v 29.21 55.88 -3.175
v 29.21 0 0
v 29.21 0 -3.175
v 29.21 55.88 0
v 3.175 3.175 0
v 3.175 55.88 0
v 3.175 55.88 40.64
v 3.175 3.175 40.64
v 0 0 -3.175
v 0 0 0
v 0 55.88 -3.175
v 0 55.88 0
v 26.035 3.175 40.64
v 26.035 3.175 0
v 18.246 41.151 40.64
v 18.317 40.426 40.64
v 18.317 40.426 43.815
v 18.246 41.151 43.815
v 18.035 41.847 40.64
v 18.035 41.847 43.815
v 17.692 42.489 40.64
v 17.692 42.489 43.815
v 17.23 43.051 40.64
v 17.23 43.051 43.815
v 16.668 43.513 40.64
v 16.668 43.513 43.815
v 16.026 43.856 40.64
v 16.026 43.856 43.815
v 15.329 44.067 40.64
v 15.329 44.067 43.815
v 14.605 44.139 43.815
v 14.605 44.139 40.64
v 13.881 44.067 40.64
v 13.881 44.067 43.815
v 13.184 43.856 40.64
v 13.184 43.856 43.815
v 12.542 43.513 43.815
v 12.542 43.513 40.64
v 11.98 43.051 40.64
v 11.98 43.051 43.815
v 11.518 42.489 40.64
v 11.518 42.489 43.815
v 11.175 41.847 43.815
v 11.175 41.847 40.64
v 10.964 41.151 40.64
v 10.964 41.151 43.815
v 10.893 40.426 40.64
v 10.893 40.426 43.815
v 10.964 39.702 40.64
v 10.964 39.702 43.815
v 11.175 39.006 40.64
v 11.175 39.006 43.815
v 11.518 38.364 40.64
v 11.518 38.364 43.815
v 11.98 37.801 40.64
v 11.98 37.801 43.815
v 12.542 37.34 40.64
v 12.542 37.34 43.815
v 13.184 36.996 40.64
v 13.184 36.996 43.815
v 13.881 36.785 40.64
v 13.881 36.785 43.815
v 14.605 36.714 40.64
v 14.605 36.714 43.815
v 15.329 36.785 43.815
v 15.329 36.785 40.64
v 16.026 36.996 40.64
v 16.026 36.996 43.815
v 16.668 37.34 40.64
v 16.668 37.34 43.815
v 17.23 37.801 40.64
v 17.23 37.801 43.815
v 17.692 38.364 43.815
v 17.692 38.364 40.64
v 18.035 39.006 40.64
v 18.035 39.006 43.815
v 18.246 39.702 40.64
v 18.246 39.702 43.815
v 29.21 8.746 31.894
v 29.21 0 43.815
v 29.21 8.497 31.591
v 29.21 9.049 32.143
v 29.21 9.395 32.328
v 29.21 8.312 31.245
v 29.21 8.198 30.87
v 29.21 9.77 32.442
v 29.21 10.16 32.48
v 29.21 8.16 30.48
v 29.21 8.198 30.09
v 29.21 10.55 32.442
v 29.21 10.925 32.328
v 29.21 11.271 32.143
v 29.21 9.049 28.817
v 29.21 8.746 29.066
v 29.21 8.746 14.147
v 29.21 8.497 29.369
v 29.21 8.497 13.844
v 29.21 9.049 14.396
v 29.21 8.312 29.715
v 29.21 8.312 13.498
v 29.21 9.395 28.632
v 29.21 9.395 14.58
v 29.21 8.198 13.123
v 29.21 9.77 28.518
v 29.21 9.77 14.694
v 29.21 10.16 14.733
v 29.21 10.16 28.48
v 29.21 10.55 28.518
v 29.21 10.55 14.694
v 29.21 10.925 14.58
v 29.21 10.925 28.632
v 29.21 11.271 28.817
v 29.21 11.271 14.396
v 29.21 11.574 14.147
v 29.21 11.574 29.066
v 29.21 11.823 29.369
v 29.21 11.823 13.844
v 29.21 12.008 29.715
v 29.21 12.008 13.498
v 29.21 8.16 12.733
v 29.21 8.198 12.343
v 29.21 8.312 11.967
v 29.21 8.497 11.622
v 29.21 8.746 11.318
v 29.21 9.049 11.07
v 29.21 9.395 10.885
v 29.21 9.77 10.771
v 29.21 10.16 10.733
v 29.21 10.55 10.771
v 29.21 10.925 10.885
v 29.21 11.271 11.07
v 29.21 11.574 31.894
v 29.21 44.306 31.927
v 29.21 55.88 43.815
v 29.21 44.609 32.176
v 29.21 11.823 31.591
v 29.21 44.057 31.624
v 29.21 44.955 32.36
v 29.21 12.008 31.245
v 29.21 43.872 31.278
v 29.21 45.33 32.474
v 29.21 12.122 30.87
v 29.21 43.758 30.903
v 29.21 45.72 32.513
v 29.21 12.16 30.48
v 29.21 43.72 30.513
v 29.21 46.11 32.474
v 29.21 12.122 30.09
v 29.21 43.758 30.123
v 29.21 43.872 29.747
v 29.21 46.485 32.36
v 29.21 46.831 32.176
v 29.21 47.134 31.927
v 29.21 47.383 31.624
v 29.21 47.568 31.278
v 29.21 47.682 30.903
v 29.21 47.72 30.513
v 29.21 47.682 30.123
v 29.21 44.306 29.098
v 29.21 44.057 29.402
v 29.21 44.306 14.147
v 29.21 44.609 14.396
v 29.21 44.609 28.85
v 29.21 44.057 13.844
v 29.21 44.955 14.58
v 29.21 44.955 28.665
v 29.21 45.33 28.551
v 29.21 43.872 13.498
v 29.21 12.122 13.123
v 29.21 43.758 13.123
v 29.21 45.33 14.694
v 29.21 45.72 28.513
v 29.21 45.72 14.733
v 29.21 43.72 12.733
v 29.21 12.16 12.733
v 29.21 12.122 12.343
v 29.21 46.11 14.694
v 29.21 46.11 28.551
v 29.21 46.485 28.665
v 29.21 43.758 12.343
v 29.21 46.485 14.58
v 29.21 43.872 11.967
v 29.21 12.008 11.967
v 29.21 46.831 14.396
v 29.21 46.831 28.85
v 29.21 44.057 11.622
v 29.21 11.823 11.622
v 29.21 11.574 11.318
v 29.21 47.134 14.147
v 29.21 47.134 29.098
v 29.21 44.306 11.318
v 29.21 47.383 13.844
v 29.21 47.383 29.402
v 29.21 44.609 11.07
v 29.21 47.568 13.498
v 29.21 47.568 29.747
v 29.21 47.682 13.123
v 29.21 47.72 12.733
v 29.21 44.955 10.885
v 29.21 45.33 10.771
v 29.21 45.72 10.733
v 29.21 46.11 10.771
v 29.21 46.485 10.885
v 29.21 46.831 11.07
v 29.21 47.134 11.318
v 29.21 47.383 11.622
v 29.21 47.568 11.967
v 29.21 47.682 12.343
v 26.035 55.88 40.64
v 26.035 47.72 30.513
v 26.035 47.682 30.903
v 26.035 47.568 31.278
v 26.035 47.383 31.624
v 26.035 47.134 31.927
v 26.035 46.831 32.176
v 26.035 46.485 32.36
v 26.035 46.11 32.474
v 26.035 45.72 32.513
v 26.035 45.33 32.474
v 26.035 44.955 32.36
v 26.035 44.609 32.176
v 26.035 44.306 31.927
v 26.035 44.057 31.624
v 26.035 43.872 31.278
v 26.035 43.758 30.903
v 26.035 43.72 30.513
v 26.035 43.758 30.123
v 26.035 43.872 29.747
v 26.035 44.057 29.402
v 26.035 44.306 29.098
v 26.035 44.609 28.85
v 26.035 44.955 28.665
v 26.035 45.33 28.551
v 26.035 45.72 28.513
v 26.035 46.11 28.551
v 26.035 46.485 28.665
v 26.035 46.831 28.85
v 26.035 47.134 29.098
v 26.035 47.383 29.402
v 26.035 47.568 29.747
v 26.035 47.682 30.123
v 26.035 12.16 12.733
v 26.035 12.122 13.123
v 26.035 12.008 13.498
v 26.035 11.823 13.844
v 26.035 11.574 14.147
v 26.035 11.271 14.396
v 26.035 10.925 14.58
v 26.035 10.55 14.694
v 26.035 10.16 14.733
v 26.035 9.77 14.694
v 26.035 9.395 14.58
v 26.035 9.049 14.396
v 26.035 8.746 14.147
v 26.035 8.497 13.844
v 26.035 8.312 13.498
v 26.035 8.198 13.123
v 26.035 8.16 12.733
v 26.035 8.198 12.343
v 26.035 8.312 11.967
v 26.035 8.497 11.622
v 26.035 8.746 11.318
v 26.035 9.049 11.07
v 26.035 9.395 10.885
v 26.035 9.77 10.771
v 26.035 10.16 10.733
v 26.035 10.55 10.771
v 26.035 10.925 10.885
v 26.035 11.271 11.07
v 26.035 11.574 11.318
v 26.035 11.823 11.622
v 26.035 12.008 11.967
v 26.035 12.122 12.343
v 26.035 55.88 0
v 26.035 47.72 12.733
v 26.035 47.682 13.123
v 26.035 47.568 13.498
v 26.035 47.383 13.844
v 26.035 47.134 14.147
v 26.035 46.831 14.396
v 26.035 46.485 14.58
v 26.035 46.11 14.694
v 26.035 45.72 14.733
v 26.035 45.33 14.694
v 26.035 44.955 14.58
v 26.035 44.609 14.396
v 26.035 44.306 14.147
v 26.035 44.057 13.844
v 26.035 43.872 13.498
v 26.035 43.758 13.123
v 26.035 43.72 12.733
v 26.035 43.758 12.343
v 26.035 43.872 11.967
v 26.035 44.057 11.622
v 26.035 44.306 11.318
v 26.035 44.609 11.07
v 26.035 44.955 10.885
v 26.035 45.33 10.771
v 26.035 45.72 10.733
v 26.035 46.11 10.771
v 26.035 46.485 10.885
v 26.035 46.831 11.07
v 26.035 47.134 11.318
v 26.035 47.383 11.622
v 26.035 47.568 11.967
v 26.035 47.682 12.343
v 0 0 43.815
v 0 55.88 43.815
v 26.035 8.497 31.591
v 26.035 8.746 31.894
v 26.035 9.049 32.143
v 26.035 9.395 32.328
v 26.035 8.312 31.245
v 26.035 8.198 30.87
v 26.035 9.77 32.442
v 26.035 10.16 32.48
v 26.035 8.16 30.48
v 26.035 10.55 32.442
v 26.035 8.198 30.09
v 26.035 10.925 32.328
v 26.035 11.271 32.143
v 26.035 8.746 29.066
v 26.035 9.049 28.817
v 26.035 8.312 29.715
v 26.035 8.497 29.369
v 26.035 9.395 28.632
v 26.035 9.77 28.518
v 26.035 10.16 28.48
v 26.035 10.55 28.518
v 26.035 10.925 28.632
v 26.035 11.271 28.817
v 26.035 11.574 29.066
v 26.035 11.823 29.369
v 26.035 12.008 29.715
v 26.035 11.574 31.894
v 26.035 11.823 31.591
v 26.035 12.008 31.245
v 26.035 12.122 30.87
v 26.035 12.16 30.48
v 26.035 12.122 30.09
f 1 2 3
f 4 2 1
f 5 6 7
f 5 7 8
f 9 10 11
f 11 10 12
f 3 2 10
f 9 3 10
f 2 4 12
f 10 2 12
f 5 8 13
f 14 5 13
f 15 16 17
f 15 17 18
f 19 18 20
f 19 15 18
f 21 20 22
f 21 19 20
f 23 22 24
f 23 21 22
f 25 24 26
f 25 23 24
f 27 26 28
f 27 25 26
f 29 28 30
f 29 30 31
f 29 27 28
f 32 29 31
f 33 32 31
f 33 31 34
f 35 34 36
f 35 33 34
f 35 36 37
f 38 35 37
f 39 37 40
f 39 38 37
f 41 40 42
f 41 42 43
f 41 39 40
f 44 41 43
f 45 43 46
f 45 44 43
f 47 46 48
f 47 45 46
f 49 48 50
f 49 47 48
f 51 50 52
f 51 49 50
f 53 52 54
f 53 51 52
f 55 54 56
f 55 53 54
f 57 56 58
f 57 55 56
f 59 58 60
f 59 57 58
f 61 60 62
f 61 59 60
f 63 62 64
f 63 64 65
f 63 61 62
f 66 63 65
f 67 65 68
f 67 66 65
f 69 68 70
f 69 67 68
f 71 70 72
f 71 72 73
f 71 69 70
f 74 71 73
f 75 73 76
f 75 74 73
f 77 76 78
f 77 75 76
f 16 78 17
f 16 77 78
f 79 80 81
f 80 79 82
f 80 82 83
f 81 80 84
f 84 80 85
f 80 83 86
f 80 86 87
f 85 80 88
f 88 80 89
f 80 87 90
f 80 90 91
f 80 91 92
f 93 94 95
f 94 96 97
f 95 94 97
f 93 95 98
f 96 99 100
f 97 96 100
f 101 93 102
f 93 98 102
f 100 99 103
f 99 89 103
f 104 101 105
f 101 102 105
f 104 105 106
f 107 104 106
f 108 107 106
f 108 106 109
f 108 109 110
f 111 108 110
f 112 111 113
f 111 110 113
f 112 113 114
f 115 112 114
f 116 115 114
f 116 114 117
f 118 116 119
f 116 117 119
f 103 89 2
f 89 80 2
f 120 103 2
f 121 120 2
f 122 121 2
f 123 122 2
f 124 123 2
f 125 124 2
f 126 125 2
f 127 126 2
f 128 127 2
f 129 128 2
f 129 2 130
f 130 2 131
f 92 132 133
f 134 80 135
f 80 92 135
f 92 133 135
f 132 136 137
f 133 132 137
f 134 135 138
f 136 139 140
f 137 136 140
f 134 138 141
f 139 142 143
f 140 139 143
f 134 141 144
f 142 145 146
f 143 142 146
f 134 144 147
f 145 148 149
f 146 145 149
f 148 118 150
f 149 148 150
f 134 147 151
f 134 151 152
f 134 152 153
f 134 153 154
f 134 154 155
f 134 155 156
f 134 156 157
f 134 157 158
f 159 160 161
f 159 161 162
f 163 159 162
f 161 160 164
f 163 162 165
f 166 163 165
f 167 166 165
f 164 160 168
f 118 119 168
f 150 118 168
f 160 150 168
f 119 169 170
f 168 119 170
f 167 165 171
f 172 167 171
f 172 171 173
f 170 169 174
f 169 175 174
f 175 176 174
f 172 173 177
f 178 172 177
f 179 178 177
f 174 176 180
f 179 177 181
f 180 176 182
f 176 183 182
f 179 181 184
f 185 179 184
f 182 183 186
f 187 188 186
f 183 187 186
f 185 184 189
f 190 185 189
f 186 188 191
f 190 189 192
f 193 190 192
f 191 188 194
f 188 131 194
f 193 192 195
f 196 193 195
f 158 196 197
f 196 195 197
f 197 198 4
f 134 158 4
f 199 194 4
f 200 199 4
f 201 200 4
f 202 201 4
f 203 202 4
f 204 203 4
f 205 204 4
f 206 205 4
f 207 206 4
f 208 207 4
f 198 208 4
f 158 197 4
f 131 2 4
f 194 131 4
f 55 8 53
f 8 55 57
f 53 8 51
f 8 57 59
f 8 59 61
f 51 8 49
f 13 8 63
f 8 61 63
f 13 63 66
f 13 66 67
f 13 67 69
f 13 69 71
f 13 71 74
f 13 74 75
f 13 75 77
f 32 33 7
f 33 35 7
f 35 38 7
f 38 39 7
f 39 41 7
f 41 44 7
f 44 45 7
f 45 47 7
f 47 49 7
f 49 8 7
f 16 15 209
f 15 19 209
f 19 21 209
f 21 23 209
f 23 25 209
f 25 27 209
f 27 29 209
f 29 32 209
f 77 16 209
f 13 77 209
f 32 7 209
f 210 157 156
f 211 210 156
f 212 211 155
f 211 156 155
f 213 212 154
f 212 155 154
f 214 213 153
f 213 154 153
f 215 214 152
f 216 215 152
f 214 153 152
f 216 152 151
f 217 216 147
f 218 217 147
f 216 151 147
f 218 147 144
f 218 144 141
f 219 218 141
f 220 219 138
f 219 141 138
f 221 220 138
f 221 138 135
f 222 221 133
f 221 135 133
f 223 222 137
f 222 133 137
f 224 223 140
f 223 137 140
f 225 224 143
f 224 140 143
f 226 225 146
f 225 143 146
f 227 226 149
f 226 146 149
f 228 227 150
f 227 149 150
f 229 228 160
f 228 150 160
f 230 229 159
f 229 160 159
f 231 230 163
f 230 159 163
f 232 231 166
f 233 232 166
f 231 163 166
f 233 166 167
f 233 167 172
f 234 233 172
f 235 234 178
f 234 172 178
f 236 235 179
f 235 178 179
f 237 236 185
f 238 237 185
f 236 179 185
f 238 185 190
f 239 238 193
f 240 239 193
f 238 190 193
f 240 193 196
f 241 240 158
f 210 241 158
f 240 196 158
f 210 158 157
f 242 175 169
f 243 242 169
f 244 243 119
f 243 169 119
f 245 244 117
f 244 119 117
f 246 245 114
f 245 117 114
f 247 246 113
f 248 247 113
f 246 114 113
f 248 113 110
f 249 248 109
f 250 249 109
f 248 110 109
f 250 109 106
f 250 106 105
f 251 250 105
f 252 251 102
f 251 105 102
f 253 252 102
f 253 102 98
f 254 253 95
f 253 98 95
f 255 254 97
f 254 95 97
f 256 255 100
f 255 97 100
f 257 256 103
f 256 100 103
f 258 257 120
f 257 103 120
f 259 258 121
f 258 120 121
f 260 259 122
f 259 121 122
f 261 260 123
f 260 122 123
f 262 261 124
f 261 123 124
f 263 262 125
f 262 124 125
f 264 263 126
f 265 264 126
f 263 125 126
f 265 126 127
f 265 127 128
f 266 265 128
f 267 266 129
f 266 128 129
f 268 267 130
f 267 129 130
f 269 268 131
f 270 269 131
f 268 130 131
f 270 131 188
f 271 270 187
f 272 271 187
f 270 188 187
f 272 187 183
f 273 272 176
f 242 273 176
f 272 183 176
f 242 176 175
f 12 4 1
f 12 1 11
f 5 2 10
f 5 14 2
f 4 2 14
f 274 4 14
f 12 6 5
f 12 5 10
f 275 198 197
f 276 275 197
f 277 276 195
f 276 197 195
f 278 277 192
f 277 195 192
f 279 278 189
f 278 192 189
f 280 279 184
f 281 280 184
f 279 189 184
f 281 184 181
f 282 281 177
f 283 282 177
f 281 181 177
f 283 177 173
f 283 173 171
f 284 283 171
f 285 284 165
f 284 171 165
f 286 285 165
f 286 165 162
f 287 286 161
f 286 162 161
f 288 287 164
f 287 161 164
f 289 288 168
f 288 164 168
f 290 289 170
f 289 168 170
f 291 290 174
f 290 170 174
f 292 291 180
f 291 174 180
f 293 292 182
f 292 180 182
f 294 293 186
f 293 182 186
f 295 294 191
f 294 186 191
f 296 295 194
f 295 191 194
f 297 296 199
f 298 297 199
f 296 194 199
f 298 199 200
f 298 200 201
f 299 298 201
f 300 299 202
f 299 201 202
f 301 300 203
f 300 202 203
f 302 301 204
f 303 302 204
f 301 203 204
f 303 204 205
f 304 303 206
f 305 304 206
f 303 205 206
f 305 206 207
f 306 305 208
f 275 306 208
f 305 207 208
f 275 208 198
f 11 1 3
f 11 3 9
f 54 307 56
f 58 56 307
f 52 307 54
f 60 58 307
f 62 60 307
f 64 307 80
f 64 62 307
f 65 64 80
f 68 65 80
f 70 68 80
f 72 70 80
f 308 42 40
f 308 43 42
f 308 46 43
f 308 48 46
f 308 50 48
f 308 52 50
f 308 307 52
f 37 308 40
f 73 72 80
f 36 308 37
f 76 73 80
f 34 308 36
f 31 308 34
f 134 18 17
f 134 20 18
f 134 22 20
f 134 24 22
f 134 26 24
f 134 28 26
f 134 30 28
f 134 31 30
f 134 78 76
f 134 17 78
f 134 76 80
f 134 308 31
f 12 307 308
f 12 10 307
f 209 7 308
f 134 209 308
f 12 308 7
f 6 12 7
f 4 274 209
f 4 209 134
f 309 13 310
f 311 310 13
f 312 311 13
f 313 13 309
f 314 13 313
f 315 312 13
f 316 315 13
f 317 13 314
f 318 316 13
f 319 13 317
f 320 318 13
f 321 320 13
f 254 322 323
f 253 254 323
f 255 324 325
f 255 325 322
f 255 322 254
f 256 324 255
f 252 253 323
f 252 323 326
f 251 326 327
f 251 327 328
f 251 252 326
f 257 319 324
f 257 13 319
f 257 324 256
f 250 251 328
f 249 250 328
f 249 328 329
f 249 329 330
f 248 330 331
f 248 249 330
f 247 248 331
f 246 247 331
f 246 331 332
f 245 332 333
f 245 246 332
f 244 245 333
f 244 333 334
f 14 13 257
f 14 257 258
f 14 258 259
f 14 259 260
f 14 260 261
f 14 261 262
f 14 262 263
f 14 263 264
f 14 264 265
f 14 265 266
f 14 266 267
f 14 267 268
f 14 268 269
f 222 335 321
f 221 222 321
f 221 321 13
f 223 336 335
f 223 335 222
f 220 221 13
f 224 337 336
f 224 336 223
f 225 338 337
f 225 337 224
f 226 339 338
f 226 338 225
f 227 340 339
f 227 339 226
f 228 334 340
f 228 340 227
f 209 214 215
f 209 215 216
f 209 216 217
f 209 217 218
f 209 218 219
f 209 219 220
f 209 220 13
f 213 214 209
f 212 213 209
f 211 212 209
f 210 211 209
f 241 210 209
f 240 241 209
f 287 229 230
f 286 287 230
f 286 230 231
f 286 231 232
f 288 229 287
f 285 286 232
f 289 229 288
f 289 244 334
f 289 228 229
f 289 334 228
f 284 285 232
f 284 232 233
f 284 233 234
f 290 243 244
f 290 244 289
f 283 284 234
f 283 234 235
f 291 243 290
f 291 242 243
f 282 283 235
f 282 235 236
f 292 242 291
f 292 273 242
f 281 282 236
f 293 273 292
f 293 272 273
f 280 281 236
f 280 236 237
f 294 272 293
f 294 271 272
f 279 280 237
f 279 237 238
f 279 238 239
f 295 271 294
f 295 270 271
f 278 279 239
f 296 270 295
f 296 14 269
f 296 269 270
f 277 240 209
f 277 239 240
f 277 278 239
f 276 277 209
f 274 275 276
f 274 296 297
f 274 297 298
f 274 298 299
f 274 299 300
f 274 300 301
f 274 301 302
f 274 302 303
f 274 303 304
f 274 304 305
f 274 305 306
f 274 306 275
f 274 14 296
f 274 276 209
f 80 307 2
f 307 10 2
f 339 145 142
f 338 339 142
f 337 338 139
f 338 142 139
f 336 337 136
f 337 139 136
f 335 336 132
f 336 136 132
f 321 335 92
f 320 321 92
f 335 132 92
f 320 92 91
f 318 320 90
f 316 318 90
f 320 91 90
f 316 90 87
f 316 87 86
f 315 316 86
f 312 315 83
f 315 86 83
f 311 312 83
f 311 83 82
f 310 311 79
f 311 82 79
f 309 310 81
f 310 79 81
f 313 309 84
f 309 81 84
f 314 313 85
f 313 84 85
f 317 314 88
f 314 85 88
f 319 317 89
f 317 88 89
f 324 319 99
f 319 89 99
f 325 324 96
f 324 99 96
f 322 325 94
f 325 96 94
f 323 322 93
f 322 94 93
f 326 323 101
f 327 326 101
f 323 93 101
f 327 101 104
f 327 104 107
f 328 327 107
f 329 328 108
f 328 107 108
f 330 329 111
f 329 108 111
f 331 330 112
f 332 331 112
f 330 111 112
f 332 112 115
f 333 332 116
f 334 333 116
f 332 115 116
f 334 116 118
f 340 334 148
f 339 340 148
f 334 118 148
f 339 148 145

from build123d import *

# Parameters (mm, degrees)
BOSS_EXTRUDE1_DEPTH = 40.64
SKETCH2_W           = 29.21
SKETCH2_H           = 55.88
BOSS_EXTRUDE2_DEPTH = 3.175
SKETCH3_W           = 29.21
SKETCH3_H           = 55.88
SKETCH3_R           = 3.712440594
BOSS_EXTRUDE3_DEPTH = 3.175
SKETCH4_R           = 2
CUT_EXTRUDE1_DEPTH  = 3.175


with BuildPart() as part:
    # Sketch1 → Boss-Extrude1 (new body)
    with BuildSketch(Plane.XY):
        Polygon((0, 0), (0, 55.88), (3.175, 55.88), (3.175, 3.175), (26.035, 3.175), (26.035, 55.88), (29.21, 55.88), (29.21, 0), align=None)
    extrude(amount=BOSS_EXTRUDE1_DEPTH)

    # Sketch3 → Boss-Extrude3 (add)
    with BuildSketch(Plane.XY.offset(40.64)):
        with Locations((14.605, 27.94)):
            Rectangle(SKETCH3_W, SKETCH3_H)
        with Locations((14.605, 40.426288934)):
            Circle(SKETCH3_R, mode=Mode.SUBTRACT)
    extrude(amount=BOSS_EXTRUDE3_DEPTH)

    # Sketch4 → Cut-Extrude1 (cut)
    with BuildSketch(Plane(origin=(29.21, 0, 0), x_dir=(0, 0, -1), z_dir=(1, 0, 0))):
        with Locations((-12.732703056, 45.72)):
            Circle(SKETCH4_R)
        with Locations((-30.48, 10.16)):
            Circle(SKETCH4_R)
        with Locations((-12.732703056, 10.16)):
            Circle(SKETCH4_R)
        with Locations((-30.512703056, 45.72)):
            Circle(SKETCH4_R)
    extrude(amount=-CUT_EXTRUDE1_DEPTH, mode=Mode.SUBTRACT)


with BuildPart() as body_2:
    # Sketch2 → Boss-Extrude2 (new body)
    with BuildSketch(Plane(origin=(0, 0, 0), x_dir=(-1, 0, 0), z_dir=(0, 0, -1))):
        with Locations((-14.605, 27.94)):
            Rectangle(SKETCH2_W, SKETCH2_H)
    extrude(amount=BOSS_EXTRUDE2_DEPTH)


solid = Compound([part.part, body_2.part])
